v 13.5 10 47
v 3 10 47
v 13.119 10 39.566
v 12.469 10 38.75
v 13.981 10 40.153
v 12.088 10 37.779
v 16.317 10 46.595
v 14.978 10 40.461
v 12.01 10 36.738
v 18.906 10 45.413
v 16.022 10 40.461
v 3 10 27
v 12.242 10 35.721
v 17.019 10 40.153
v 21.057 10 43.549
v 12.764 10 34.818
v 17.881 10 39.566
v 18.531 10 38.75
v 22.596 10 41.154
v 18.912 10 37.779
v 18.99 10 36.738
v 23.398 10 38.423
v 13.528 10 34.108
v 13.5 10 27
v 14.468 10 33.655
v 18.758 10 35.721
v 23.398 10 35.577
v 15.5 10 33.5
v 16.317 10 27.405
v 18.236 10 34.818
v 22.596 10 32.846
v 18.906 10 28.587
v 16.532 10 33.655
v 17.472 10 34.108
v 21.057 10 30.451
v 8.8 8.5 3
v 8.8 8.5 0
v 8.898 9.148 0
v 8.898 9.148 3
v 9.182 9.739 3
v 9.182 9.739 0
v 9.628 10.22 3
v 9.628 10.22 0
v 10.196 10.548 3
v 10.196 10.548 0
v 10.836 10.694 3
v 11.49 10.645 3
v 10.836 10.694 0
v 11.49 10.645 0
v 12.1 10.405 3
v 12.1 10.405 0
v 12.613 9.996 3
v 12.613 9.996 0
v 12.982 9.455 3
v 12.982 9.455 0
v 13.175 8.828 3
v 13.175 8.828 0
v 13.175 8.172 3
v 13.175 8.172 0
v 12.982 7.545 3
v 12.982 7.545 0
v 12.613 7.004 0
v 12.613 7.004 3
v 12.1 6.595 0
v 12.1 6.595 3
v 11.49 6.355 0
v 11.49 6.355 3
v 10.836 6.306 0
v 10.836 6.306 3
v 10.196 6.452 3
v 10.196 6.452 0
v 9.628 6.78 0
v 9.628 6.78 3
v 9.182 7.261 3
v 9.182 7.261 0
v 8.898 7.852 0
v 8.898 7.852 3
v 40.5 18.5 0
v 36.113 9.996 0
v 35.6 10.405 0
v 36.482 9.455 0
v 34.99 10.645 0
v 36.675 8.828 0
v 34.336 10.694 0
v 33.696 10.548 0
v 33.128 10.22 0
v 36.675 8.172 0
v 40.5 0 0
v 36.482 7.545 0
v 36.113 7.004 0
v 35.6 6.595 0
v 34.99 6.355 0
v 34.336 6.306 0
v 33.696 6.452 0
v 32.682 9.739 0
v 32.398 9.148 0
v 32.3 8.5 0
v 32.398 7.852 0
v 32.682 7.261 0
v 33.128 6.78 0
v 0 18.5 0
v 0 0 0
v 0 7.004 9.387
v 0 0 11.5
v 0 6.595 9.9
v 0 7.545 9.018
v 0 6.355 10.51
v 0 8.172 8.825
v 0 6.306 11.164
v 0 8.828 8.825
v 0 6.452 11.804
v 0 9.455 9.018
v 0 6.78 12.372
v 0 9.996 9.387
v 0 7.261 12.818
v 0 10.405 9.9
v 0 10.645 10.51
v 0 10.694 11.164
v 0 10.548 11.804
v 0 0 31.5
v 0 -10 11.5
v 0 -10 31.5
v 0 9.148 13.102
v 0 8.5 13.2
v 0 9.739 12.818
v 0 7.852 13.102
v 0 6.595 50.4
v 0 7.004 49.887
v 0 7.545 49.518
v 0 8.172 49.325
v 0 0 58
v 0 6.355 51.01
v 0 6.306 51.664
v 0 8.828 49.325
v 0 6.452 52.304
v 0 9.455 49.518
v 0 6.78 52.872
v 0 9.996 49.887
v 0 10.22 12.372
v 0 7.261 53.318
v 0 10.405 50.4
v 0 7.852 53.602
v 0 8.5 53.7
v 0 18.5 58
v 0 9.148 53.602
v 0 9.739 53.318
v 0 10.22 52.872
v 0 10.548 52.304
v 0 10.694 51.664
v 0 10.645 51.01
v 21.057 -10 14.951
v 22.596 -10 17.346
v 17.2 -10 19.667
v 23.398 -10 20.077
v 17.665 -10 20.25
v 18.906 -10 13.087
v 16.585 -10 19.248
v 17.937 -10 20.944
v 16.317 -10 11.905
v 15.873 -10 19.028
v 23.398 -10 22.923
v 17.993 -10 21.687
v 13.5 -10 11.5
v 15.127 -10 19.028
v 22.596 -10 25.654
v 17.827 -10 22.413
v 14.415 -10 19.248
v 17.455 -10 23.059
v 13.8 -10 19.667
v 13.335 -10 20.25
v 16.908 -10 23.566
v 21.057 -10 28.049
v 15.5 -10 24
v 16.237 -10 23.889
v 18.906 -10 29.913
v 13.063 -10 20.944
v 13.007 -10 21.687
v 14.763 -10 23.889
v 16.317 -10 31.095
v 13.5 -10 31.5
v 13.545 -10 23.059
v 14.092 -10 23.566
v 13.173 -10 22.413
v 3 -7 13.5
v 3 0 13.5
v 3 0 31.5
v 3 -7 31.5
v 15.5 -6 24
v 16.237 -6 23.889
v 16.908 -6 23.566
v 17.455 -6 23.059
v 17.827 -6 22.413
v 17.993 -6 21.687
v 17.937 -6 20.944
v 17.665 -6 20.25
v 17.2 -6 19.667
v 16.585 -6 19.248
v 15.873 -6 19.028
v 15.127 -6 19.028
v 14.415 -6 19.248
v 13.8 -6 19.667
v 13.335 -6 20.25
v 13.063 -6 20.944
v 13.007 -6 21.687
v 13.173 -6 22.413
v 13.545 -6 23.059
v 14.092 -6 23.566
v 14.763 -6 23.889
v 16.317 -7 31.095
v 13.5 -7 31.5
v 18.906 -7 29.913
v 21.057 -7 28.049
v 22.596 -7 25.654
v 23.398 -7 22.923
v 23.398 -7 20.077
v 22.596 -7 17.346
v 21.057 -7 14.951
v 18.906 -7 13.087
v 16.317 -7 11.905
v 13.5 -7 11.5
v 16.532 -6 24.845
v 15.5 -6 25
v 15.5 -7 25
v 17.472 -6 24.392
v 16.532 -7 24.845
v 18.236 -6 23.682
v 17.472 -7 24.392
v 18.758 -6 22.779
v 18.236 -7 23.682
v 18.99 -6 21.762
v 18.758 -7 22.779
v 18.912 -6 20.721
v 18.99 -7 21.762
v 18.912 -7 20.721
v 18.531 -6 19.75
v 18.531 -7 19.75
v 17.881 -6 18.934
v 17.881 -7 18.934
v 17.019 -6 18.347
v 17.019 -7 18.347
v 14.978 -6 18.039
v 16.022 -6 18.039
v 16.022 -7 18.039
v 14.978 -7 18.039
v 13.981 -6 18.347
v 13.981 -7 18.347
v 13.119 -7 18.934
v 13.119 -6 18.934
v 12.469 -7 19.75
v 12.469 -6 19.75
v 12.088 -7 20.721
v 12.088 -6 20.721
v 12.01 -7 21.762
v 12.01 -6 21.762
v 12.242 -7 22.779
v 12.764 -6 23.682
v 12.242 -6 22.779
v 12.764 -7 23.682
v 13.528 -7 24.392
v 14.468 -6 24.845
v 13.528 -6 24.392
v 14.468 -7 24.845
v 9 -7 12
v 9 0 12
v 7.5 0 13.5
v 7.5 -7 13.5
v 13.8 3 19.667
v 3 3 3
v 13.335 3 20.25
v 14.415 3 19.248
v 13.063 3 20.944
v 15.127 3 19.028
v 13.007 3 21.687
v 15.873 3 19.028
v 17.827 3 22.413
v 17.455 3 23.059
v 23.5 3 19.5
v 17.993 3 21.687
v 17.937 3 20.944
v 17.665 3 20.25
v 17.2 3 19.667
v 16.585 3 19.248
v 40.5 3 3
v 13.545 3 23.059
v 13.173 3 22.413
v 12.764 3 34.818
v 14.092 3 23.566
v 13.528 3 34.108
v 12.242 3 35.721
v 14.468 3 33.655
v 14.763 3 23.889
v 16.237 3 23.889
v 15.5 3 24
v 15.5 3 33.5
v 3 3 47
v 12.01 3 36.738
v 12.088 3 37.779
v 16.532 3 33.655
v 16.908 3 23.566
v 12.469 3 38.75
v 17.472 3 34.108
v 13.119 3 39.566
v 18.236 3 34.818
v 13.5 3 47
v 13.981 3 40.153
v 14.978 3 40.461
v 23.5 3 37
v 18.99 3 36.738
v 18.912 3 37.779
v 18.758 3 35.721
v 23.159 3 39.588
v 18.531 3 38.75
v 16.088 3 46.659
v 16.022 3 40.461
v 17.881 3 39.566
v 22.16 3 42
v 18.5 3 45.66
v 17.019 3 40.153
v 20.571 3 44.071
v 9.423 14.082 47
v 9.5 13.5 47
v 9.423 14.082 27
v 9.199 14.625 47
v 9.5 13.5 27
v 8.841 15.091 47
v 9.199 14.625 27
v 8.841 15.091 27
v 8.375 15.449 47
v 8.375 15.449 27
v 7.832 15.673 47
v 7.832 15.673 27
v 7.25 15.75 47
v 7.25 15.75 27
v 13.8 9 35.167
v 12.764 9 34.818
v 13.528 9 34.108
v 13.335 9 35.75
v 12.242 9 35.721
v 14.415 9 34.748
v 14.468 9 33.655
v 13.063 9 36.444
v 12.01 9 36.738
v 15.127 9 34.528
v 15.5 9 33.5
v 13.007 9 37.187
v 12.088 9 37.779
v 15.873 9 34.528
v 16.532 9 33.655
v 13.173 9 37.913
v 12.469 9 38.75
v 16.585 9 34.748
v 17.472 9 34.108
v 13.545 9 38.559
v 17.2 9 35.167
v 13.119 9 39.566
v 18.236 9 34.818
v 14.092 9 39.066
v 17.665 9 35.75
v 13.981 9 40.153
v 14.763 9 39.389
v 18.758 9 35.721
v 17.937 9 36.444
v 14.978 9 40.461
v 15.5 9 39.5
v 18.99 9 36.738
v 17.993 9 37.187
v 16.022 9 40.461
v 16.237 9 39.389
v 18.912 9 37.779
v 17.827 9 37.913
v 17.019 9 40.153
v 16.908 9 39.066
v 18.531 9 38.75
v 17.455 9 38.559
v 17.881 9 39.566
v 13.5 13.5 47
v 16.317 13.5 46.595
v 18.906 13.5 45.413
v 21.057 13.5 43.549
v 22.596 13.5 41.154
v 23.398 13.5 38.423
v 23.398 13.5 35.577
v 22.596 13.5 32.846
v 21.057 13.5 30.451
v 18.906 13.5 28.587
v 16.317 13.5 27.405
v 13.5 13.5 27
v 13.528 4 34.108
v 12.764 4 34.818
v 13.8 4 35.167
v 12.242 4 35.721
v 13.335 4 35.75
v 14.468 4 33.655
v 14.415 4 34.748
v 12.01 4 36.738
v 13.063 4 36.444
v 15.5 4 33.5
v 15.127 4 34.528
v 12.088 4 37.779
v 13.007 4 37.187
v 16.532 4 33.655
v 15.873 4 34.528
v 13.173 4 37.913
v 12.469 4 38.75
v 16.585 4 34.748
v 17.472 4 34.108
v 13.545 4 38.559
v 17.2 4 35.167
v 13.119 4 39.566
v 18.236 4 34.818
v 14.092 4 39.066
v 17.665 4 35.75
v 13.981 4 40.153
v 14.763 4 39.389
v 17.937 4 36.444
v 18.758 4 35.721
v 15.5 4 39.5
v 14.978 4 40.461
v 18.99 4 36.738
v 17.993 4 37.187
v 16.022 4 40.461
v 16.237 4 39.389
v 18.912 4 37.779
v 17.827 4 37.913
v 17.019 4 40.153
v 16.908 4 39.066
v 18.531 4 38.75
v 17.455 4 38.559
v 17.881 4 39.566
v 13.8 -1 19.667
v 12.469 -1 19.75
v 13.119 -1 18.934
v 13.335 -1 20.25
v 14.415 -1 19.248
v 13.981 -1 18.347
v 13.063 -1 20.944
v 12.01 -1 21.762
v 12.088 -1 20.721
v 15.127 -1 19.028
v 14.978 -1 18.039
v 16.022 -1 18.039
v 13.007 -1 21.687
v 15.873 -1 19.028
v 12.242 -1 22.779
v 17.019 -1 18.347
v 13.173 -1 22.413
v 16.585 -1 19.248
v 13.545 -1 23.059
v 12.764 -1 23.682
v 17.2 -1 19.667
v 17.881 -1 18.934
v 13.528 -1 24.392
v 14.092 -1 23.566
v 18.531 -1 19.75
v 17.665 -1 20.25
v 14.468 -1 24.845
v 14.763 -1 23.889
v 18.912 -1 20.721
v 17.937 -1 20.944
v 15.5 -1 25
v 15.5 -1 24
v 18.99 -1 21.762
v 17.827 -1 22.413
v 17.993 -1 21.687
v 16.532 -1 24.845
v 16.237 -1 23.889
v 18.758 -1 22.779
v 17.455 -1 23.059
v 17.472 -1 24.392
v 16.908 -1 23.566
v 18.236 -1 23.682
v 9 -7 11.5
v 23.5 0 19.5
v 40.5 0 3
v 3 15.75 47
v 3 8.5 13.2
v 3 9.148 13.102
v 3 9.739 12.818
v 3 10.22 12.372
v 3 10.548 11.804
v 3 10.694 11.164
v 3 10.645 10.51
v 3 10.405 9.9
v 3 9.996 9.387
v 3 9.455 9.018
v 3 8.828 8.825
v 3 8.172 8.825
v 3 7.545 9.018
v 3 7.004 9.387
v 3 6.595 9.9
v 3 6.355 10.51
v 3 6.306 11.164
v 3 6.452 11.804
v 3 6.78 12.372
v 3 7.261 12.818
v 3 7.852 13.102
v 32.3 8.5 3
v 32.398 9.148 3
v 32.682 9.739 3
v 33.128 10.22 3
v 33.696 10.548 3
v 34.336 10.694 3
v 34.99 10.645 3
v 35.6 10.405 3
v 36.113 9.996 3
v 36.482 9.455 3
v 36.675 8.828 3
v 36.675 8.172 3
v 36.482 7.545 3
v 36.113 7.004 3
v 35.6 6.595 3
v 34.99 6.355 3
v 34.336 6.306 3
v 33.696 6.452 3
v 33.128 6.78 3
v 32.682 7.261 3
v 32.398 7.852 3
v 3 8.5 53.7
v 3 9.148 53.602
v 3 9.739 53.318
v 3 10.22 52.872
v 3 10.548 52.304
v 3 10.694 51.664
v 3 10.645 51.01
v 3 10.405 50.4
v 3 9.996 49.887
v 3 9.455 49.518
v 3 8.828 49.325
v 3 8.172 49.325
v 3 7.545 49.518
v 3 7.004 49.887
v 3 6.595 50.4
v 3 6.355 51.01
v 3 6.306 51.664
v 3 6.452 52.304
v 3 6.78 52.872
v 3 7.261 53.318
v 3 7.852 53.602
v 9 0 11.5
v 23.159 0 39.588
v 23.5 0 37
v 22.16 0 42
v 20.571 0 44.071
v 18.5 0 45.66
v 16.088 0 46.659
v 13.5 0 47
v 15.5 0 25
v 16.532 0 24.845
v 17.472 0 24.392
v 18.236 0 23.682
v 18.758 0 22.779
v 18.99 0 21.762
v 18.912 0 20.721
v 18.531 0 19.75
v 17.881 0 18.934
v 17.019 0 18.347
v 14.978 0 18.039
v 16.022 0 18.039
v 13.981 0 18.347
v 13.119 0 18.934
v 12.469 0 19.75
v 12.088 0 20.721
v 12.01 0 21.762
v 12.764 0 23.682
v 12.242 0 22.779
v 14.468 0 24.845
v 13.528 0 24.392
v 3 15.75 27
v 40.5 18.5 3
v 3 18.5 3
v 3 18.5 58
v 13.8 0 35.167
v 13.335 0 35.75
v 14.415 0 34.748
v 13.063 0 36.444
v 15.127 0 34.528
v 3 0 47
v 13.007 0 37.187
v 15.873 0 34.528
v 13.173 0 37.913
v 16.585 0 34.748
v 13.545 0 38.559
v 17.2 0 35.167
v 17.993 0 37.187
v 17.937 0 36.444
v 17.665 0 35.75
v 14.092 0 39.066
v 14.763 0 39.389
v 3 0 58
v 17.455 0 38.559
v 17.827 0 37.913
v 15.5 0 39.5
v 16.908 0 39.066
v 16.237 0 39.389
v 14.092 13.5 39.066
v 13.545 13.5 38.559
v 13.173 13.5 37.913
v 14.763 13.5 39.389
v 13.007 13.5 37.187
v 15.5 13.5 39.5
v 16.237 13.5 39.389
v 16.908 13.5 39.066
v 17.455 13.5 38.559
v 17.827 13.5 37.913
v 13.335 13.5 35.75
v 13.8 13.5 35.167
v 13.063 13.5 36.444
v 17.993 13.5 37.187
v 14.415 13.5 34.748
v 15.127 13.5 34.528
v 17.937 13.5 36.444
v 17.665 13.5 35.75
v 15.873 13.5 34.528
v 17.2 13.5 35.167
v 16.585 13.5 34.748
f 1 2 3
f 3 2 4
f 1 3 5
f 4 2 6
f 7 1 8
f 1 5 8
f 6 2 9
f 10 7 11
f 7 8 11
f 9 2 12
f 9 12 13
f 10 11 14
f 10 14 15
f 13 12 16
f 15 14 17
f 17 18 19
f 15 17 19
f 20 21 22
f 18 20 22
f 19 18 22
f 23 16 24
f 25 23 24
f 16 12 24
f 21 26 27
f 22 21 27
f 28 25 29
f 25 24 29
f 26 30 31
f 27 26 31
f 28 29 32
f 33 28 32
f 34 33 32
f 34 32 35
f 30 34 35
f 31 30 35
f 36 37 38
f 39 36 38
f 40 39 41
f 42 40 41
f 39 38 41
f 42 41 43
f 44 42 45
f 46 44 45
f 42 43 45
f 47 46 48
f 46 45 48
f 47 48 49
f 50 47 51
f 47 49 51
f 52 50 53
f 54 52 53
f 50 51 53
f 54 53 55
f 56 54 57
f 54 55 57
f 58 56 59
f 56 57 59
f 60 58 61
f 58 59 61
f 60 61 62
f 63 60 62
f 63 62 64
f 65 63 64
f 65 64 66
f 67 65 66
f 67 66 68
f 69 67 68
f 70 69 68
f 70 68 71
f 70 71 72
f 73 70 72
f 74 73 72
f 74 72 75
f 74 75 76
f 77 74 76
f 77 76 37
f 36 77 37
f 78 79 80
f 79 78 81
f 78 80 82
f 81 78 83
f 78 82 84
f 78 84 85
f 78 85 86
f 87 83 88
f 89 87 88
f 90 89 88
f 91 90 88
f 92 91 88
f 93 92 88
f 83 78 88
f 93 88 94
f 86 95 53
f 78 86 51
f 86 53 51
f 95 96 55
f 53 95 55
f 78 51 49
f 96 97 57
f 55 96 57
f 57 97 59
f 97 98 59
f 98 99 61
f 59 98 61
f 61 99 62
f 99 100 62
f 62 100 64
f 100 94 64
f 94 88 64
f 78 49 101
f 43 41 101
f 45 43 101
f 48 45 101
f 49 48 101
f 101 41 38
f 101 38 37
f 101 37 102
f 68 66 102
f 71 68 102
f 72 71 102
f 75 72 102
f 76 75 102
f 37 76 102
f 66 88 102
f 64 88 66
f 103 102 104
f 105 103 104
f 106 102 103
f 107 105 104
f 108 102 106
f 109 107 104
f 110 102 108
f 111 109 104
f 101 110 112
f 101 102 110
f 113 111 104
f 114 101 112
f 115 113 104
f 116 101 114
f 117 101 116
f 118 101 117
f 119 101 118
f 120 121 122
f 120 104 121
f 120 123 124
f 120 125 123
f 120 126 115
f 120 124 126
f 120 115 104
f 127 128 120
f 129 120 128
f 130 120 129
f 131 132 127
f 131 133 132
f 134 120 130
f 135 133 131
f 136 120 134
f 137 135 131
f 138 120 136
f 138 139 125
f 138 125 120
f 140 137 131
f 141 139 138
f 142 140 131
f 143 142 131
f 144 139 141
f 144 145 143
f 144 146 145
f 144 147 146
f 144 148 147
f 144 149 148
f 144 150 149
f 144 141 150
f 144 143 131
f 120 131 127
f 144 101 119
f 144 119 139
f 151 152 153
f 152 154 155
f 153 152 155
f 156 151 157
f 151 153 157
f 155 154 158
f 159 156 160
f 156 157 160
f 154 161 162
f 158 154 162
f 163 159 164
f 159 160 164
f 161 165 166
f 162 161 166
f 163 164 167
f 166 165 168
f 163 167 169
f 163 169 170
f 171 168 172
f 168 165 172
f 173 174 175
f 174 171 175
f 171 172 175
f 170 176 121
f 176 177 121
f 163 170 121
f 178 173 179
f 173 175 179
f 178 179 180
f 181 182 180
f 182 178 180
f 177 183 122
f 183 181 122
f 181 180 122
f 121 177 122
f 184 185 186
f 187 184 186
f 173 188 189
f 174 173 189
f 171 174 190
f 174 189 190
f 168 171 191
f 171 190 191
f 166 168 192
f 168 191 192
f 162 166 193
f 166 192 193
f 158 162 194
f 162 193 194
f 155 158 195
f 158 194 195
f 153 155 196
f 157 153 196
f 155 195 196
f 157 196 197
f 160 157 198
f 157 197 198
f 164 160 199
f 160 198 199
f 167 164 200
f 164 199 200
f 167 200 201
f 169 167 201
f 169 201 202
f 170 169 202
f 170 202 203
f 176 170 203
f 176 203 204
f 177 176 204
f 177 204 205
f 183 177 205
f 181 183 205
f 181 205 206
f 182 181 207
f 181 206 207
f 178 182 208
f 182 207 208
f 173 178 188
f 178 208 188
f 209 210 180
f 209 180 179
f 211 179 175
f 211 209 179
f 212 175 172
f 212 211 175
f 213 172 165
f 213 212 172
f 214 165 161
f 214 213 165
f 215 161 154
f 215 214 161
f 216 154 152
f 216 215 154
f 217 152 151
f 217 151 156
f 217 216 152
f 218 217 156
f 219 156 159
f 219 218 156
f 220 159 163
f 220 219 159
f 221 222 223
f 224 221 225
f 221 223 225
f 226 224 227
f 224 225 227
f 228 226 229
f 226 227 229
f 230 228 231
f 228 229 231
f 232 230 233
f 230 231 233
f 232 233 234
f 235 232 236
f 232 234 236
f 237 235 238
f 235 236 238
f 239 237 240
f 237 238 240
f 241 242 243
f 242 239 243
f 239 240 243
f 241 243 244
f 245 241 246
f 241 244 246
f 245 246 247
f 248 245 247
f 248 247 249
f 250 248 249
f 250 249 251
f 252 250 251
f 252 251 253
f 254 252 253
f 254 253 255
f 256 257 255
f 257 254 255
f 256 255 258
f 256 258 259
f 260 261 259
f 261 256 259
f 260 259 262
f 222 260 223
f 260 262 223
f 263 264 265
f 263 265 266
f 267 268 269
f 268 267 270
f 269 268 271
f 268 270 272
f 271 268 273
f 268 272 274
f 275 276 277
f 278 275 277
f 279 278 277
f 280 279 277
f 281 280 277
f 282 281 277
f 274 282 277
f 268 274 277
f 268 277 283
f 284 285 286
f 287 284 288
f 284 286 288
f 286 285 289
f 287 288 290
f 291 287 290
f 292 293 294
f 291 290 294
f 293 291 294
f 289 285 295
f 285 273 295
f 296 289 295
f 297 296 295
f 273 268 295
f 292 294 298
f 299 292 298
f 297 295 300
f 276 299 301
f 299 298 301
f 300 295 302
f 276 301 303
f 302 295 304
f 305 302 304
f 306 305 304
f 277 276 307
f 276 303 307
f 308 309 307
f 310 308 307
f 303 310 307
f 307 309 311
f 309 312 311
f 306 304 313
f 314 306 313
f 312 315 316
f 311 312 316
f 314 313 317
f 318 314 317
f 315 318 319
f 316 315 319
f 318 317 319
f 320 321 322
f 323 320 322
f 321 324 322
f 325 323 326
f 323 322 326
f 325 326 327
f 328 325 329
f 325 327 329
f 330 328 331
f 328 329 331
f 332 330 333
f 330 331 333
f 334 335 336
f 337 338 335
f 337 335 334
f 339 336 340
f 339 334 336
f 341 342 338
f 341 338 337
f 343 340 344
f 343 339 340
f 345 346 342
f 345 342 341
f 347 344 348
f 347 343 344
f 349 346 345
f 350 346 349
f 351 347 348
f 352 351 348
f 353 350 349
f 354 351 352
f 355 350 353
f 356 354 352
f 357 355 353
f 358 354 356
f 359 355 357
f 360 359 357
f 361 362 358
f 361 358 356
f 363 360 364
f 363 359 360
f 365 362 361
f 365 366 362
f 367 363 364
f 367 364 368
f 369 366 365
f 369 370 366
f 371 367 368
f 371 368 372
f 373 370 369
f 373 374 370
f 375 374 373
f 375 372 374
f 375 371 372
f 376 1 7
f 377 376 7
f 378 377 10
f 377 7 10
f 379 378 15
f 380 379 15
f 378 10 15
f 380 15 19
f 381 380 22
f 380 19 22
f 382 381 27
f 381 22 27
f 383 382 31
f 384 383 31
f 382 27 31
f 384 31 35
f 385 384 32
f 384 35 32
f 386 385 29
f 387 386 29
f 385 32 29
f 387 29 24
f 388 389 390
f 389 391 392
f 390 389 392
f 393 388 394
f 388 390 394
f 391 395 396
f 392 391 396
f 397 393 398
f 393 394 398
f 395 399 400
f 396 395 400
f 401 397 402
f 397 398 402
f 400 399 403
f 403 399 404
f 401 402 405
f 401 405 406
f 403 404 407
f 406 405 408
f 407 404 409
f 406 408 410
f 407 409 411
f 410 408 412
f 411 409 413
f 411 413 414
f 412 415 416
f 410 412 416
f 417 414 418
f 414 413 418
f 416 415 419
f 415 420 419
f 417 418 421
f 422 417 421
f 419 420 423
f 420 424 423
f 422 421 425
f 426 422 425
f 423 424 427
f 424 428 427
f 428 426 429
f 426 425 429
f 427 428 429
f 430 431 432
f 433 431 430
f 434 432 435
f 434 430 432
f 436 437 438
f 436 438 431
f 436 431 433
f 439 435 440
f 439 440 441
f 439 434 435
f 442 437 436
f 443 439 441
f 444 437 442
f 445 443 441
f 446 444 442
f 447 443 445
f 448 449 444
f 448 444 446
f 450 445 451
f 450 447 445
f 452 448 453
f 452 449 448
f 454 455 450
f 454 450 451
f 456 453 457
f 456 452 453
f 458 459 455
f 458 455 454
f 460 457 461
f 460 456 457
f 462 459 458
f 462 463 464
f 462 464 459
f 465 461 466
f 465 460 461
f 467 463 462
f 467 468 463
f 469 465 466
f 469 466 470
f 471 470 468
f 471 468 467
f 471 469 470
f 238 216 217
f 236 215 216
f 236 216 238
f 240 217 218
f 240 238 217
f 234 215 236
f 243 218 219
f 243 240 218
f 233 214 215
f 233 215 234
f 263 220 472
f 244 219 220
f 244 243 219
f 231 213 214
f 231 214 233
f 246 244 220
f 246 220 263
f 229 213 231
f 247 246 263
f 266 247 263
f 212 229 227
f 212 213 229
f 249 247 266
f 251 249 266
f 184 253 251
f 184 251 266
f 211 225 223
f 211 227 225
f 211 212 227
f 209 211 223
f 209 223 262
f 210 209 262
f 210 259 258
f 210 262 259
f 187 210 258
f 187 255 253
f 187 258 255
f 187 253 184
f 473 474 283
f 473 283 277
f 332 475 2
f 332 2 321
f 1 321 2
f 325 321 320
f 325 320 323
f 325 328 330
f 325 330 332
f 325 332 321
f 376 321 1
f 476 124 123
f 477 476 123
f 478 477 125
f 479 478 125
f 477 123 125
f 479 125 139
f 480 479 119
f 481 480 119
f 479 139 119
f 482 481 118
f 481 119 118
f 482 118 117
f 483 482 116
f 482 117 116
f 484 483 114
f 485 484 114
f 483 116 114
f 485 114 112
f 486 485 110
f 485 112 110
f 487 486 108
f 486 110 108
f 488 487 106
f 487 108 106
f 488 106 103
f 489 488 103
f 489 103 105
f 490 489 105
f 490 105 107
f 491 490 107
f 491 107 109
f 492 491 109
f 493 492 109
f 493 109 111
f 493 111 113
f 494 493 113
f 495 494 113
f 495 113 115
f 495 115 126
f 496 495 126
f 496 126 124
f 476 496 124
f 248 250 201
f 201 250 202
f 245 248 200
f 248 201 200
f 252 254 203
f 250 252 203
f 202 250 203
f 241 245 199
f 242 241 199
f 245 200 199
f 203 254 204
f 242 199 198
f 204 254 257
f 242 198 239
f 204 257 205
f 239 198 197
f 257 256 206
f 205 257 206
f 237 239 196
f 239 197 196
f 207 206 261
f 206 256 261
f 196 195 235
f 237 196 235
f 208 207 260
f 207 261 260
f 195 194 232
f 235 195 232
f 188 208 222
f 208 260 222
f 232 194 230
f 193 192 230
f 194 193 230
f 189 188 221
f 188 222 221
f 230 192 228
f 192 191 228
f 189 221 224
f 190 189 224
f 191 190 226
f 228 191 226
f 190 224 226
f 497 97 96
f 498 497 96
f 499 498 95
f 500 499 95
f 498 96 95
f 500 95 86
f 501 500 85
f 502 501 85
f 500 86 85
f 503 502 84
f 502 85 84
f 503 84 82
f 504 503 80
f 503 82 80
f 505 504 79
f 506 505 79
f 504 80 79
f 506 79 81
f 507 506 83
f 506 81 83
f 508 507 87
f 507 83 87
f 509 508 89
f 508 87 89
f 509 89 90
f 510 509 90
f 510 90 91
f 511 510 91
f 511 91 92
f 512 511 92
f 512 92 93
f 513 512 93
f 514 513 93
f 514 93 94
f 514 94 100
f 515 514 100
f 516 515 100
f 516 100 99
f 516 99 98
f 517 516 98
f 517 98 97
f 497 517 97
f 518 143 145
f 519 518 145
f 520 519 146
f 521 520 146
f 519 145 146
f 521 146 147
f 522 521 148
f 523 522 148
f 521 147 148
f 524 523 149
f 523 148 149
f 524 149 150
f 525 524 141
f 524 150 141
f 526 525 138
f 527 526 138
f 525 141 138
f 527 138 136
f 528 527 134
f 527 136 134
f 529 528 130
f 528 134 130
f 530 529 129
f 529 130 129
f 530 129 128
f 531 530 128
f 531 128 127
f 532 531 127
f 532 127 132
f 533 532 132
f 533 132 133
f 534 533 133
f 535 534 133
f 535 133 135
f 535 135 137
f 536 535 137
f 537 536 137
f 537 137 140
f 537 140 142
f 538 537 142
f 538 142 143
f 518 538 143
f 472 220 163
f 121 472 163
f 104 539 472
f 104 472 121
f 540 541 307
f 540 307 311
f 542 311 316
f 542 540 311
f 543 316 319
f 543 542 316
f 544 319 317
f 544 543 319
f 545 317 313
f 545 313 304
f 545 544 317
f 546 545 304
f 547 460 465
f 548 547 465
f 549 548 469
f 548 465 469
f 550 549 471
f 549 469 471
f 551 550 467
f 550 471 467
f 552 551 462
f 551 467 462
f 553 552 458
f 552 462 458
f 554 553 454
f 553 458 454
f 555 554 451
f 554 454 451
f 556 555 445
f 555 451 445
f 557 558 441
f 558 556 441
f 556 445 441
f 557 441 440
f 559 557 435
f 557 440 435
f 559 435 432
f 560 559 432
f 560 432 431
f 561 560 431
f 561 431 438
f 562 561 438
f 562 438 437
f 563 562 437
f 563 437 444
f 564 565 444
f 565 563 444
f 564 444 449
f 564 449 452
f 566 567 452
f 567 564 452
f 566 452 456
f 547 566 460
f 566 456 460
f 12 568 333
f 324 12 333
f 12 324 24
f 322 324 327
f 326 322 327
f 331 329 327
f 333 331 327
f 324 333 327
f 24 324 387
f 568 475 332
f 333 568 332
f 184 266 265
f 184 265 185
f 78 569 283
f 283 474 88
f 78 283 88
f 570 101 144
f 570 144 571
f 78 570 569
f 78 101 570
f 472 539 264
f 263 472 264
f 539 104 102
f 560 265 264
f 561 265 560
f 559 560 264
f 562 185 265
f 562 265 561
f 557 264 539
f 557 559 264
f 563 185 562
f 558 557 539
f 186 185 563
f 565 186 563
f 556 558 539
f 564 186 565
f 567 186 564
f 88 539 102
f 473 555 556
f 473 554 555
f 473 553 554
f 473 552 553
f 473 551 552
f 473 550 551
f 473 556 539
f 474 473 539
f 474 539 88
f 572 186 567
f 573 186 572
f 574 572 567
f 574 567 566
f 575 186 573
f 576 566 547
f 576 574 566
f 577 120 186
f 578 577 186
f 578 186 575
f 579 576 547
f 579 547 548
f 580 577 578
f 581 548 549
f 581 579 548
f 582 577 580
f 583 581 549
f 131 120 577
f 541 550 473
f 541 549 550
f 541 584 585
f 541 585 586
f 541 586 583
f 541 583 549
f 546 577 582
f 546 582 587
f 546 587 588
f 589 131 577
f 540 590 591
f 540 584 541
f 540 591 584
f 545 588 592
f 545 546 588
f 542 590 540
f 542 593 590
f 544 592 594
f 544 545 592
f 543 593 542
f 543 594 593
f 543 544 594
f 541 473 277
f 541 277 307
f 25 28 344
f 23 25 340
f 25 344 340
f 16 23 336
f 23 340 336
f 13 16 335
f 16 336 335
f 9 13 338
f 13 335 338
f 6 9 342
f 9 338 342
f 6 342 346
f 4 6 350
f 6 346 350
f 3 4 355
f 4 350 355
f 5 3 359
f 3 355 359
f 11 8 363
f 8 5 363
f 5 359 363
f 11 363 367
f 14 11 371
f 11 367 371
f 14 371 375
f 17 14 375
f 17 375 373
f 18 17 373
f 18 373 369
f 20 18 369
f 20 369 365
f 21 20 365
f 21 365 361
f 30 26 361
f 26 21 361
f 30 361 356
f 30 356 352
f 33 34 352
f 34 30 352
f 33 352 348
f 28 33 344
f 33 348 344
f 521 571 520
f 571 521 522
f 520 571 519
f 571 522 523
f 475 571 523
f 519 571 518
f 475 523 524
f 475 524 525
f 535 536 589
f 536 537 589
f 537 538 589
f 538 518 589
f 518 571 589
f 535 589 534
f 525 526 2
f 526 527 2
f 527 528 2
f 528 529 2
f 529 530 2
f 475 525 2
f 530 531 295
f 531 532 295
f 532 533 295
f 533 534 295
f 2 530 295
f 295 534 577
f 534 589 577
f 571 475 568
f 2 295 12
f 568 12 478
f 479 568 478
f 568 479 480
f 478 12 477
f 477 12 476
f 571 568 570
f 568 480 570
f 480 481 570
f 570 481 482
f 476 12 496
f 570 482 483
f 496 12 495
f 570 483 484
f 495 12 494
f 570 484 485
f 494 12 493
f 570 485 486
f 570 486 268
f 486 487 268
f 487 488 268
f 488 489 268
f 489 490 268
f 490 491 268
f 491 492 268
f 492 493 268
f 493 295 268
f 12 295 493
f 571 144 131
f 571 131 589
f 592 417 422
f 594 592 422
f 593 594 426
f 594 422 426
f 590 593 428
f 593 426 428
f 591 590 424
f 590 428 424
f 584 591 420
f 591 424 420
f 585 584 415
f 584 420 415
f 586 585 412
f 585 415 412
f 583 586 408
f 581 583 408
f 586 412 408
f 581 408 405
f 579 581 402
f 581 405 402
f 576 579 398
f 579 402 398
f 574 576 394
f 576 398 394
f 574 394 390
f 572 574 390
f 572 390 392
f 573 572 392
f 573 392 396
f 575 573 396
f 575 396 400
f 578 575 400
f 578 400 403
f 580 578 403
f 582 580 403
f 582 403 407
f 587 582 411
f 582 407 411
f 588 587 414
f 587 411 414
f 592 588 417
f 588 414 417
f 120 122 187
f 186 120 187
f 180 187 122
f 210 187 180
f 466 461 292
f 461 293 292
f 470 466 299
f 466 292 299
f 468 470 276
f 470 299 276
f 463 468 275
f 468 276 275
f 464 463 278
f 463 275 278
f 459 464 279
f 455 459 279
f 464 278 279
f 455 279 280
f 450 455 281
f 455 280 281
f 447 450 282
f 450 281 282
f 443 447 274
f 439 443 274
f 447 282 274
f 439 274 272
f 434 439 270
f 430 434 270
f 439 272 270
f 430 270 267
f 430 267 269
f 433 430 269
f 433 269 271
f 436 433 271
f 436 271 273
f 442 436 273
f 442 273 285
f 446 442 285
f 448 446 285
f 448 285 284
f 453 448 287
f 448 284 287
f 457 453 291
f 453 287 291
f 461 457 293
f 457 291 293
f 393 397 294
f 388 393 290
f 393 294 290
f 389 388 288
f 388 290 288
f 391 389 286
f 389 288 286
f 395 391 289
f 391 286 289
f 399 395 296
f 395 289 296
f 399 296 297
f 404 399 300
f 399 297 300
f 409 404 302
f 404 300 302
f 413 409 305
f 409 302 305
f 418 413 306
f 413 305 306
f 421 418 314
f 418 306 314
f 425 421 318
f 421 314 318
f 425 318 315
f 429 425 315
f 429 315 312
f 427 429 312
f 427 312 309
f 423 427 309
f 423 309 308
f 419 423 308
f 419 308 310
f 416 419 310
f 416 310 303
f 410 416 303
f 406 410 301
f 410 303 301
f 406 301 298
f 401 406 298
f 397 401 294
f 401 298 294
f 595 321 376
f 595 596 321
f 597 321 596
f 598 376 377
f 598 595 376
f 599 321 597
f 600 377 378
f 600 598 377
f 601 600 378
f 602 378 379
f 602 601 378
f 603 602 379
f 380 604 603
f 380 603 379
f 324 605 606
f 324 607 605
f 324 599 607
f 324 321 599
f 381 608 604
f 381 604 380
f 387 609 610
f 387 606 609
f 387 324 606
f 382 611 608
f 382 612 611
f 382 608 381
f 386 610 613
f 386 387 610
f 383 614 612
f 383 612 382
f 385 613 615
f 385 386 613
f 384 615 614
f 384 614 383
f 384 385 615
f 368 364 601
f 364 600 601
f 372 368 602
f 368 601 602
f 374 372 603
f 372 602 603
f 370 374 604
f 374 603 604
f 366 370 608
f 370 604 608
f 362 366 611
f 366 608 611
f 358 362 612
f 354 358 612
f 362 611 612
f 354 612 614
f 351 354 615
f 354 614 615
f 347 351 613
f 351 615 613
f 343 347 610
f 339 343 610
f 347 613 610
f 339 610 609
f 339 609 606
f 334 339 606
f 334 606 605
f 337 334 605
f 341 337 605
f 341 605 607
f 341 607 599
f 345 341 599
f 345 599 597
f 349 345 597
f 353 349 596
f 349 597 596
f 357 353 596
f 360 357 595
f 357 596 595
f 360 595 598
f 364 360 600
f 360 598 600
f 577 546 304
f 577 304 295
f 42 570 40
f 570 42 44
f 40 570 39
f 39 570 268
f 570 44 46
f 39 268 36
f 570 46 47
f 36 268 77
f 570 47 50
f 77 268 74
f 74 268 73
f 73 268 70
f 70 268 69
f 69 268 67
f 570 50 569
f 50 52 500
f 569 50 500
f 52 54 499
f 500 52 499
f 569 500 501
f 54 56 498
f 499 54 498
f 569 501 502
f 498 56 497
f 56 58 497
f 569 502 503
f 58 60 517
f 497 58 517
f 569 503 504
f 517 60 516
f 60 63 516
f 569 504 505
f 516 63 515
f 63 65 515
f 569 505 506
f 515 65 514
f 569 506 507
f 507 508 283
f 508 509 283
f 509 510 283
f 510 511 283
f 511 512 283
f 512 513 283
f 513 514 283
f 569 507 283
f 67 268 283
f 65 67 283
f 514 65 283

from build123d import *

# Parameters (mm, degrees)
BOSS_EXTRUDE1_DEPTH = 18.5
BOSS_EXTRUDE2_DEPTH = 3
BOSS_EXTRUDE3_START = 7
BOSS_EXTRUDE3_DEPTH = 3.5
SKETCH4_W           = 6.5
SKETCH4_H           = 2.25
BOSS_EXTRUDE4_DEPTH = 20
FILLET1_R           = 2.25
BOSS_EXTRUDE5_DEPTH = 7
BOSS_EXTRUDE6_DEPTH = 3
SKETCH7_R           = 2.5
CUT_EXTRUDE1_DEPTH  = 75.541934507
SKETCH8_R           = 2.2
CUT_EXTRUDE2_DEPTH  = 74.11976477
CUT_EXTRUDE3_REACH  = 75.12
SKETCH9_R           = 2.2
BOSS_EXTRUDE7_REACH = 77.196
SKETCH10_R          = 3.5
SKETCH10_R_2        = 2.5
BOSS_EXTRUDE8_REACH = 74.419
SKETCH11_R          = 3.5
SKETCH11_R_2        = 2.5
CUT_EXTRUDE4_REACH  = 66.742
SKETCH12_W          = 7
SKETCH12_H          = 5
CHAMFER1_SIZE       = 1.5


with BuildPart() as part:
    # Sketch1 → Boss-Extrude1 (new body)
    with BuildSketch(Plane(origin=(0, 0, 0), x_dir=(1, 0, 0), z_dir=(0, 1, 0))):
        Polygon((40.5, 0), (0, 0), (0, -58), (3, -58), (3, -3), (40.5, -3), align=None)
    extrude(amount=BOSS_EXTRUDE1_DEPTH)

    # Sketch2 → Boss-Extrude2 (add)
    with BuildSketch(Plane.XZ):
        with BuildLine():
            Line((40.5, 3), (23.5, 19.5))
            Line((23.5, 19.5), (23.5, 37))
            ThreePointArc((23.5, 37), (20.571067812, 44.071067812), (13.5, 47))
            Line((13.5, 47), (3, 47))
            Line((3, 47), (3, 3))
            Line((3, 3), (40.5, 3))
        make_face()
    extrude(amount=-BOSS_EXTRUDE2_DEPTH)

    # Sketch3 → Boss-Extrude3 (add)
    with BuildSketch(Plane(origin=(0, 3, 0), x_dir=(1, 0, 0), z_dir=(0, 1, 0)).offset(BOSS_EXTRUDE3_START)):
        with BuildLine():
            Line((3, -47), (13.5, -47))
            ThreePointArc((13.5, -47), (23.5, -37), (13.5, -27))
            Line((13.5, -27), (3, -27))
            Line((3, -27), (3, -47))
        make_face()
    extrude(amount=BOSS_EXTRUDE3_DEPTH)

    # Sketch4 → Boss-Extrude4 (add)
    with BuildSketch(Plane.XY.offset(47)):
        with Locations((6.25, 14.625)):
            Rectangle(SKETCH4_W, SKETCH4_H)
    extrude(amount=-BOSS_EXTRUDE4_DEPTH)

    # Fillet1
    fillet1_edges = [part.edges().sort_by_distance(p)[0] for p in [
        (9.5, 15.75, 37),
    ]]
    fillet(fillet1_edges, radius=FILLET1_R - 0.0001)  # a hair under: the kernel refuses the full size

    # Sketch5 → Boss-Extrude5 (add)
    with BuildSketch(Plane.XZ):
        Polygon((0, 31.5), (0, 11.5), (9, 11.5), (9, 13.5), (3, 13.5), (3, 31.5), align=None)
    extrude(amount=BOSS_EXTRUDE5_DEPTH)

    # Sketch6 → Boss-Extrude6 (add)
    with BuildSketch(Plane.XZ.offset(7)):
        with BuildLine():
            Line((0, 11.5), (0, 31.5))
            Line((0, 31.5), (13.5, 31.5))
            ThreePointArc((13.5, 31.5), (23.5, 21.5), (13.5, 11.5))
            Line((13.5, 11.5), (0, 11.5))
        make_face()
    extrude(amount=BOSS_EXTRUDE6_DEPTH)

    # Sketch7 → Cut-Extrude1 (cut, through all)
    with BuildSketch(Plane(origin=(0, 13.5, 0), x_dir=(1, 0, 0), z_dir=(0, 1, 0))):
        with Locations(Location((15.5, -21.5, 0), (0, 0, 270))):
            Circle(SKETCH7_R)
        with Locations(Location((15.5, -37, 0), (0, 0, 270))):
            Circle(SKETCH7_R)
    extrude(amount=-CUT_EXTRUDE1_DEPTH, mode=Mode.SUBTRACT)

    # Sketch8 → Cut-Extrude2 (cut, through all)
    with BuildSketch(Plane.ZY):
        with Locations((11, 8.5)):
            Circle(SKETCH8_R)
        with Locations((51.5, 8.5)):
            Circle(SKETCH8_R)
    extrude(amount=-CUT_EXTRUDE2_DEPTH, mode=Mode.SUBTRACT)

    # Sketch9 → Cut-Extrude3 (cut, up to next)
    with BuildSketch(Plane(origin=(0, 0, 0), x_dir=(-1, 0, 0), z_dir=(0, 0, -1)), mode=Mode.PRIVATE) as cut_extrude3_sk1:
        with Locations((-34.5, 8.5)):
            Circle(SKETCH9_R)
    cut_extrude3_tool1 = extrude(cut_extrude3_sk1.sketch, amount=-CUT_EXTRUDE3_REACH, mode=Mode.PRIVATE) & part.part
    # Sketch9 → Cut-Extrude3 (cut, up to next)
    with BuildSketch(Plane(origin=(0, 0, 0), x_dir=(-1, 0, 0), z_dir=(0, 0, -1)), mode=Mode.PRIVATE) as cut_extrude3_sk2:
        with Locations((-11, 8.5)):
            Circle(SKETCH9_R)
    cut_extrude3_tool2 = extrude(cut_extrude3_sk2.sketch, amount=-CUT_EXTRUDE3_REACH, mode=Mode.PRIVATE) & part.part
    add(cut_extrude3_tool1.solids().sort_by_distance((34.5, 8.5, 0))[0], mode=Mode.SUBTRACT)
    add(cut_extrude3_tool2.solids().sort_by_distance((11, 8.5, 0))[0], mode=Mode.SUBTRACT)

    # Sketch10 → Boss-Extrude7 (add, up to next)
    with BuildSketch(Plane(origin=(0, -7, 0), x_dir=(1, 0, 0), z_dir=(0, 1, 0)), mode=Mode.PRIVATE) as boss_extrude7_sk1:
        with Locations(Location((15.5, -21.5, 0), (0, 0, 270))):
            Circle(SKETCH10_R)
        with Locations(Location((15.5, -21.5, 0), (0, 0, 270))):
            Circle(SKETCH10_R_2, mode=Mode.SUBTRACT)
    boss_extrude7_tool1 = extrude(boss_extrude7_sk1.sketch, amount=BOSS_EXTRUDE7_REACH, mode=Mode.PRIVATE) - part.part
    add(boss_extrude7_tool1.solids().sort_by_distance((15.5, -7, 18.098995))[0])

    # Sketch11 → Boss-Extrude8 (add, up to next)
    with BuildSketch(Plane(origin=(0, 3, 0), x_dir=(1, 0, 0), z_dir=(0, 1, 0)), mode=Mode.PRIVATE) as boss_extrude8_sk1:
        with Locations(Location((15.5, -37, 0), (0, 0, 90))):
            Circle(SKETCH11_R)
        with Locations(Location((15.5, -37, 0), (0, 0, 270))):
            Circle(SKETCH11_R_2, mode=Mode.SUBTRACT)
    boss_extrude8_tool1 = extrude(boss_extrude8_sk1.sketch, amount=BOSS_EXTRUDE8_REACH, mode=Mode.PRIVATE) - part.part
    add(boss_extrude8_tool1.solids().sort_by_distance((15.5, 3, 40.401005))[0])

    # Cut-Extrude4: up to this face of the body (flat: up to its plane)
    cut_extrude4_end = Plane(part.part.faces().sort_by_distance((21.694792225, 10.874217494, 3))[0])
    # Sketch12 → Cut-Extrude4 (cut, up to the picked face)
    with BuildSketch(Plane.XY.offset(47), mode=Mode.PRIVATE) as cut_extrude4_sk1:
        with Locations((15.5, -3.5)):
            Rectangle(SKETCH12_W, SKETCH12_H)
    cut_extrude4_tool1 = split(extrude(cut_extrude4_sk1.sketch, amount=-CUT_EXTRUDE4_REACH, mode=Mode.PRIVATE), bisect_by=cut_extrude4_end, keep=Keep.BOTH, mode=Mode.PRIVATE)
    # Sketch12 → Cut-Extrude4 (cut, up to the picked face)
    with BuildSketch(Plane.XY.offset(47), mode=Mode.PRIVATE) as cut_extrude4_sk2:
        with Locations((15.5, 6.5)):
            Rectangle(SKETCH12_W, SKETCH12_H)
    cut_extrude4_tool2 = split(extrude(cut_extrude4_sk2.sketch, amount=-CUT_EXTRUDE4_REACH, mode=Mode.PRIVATE), bisect_by=cut_extrude4_end, keep=Keep.BOTH, mode=Mode.PRIVATE)
    add(cut_extrude4_tool1.solids().sort_by(Axis((15.5, -3.5, 47), (0, 0, -1)))[0], mode=Mode.SUBTRACT)
    add(cut_extrude4_tool2.solids().sort_by(Axis((15.5, 6.5, 47), (0, 0, -1)))[0], mode=Mode.SUBTRACT)

    # Chamfer1
    chamfer1_edges = [part.edges().sort_by_distance(p)[0] for p in [
        (9, -3.5, 13.5),
    ]]
    chamfer(chamfer1_edges, length=CHAMFER1_SIZE)


solid = part.part
